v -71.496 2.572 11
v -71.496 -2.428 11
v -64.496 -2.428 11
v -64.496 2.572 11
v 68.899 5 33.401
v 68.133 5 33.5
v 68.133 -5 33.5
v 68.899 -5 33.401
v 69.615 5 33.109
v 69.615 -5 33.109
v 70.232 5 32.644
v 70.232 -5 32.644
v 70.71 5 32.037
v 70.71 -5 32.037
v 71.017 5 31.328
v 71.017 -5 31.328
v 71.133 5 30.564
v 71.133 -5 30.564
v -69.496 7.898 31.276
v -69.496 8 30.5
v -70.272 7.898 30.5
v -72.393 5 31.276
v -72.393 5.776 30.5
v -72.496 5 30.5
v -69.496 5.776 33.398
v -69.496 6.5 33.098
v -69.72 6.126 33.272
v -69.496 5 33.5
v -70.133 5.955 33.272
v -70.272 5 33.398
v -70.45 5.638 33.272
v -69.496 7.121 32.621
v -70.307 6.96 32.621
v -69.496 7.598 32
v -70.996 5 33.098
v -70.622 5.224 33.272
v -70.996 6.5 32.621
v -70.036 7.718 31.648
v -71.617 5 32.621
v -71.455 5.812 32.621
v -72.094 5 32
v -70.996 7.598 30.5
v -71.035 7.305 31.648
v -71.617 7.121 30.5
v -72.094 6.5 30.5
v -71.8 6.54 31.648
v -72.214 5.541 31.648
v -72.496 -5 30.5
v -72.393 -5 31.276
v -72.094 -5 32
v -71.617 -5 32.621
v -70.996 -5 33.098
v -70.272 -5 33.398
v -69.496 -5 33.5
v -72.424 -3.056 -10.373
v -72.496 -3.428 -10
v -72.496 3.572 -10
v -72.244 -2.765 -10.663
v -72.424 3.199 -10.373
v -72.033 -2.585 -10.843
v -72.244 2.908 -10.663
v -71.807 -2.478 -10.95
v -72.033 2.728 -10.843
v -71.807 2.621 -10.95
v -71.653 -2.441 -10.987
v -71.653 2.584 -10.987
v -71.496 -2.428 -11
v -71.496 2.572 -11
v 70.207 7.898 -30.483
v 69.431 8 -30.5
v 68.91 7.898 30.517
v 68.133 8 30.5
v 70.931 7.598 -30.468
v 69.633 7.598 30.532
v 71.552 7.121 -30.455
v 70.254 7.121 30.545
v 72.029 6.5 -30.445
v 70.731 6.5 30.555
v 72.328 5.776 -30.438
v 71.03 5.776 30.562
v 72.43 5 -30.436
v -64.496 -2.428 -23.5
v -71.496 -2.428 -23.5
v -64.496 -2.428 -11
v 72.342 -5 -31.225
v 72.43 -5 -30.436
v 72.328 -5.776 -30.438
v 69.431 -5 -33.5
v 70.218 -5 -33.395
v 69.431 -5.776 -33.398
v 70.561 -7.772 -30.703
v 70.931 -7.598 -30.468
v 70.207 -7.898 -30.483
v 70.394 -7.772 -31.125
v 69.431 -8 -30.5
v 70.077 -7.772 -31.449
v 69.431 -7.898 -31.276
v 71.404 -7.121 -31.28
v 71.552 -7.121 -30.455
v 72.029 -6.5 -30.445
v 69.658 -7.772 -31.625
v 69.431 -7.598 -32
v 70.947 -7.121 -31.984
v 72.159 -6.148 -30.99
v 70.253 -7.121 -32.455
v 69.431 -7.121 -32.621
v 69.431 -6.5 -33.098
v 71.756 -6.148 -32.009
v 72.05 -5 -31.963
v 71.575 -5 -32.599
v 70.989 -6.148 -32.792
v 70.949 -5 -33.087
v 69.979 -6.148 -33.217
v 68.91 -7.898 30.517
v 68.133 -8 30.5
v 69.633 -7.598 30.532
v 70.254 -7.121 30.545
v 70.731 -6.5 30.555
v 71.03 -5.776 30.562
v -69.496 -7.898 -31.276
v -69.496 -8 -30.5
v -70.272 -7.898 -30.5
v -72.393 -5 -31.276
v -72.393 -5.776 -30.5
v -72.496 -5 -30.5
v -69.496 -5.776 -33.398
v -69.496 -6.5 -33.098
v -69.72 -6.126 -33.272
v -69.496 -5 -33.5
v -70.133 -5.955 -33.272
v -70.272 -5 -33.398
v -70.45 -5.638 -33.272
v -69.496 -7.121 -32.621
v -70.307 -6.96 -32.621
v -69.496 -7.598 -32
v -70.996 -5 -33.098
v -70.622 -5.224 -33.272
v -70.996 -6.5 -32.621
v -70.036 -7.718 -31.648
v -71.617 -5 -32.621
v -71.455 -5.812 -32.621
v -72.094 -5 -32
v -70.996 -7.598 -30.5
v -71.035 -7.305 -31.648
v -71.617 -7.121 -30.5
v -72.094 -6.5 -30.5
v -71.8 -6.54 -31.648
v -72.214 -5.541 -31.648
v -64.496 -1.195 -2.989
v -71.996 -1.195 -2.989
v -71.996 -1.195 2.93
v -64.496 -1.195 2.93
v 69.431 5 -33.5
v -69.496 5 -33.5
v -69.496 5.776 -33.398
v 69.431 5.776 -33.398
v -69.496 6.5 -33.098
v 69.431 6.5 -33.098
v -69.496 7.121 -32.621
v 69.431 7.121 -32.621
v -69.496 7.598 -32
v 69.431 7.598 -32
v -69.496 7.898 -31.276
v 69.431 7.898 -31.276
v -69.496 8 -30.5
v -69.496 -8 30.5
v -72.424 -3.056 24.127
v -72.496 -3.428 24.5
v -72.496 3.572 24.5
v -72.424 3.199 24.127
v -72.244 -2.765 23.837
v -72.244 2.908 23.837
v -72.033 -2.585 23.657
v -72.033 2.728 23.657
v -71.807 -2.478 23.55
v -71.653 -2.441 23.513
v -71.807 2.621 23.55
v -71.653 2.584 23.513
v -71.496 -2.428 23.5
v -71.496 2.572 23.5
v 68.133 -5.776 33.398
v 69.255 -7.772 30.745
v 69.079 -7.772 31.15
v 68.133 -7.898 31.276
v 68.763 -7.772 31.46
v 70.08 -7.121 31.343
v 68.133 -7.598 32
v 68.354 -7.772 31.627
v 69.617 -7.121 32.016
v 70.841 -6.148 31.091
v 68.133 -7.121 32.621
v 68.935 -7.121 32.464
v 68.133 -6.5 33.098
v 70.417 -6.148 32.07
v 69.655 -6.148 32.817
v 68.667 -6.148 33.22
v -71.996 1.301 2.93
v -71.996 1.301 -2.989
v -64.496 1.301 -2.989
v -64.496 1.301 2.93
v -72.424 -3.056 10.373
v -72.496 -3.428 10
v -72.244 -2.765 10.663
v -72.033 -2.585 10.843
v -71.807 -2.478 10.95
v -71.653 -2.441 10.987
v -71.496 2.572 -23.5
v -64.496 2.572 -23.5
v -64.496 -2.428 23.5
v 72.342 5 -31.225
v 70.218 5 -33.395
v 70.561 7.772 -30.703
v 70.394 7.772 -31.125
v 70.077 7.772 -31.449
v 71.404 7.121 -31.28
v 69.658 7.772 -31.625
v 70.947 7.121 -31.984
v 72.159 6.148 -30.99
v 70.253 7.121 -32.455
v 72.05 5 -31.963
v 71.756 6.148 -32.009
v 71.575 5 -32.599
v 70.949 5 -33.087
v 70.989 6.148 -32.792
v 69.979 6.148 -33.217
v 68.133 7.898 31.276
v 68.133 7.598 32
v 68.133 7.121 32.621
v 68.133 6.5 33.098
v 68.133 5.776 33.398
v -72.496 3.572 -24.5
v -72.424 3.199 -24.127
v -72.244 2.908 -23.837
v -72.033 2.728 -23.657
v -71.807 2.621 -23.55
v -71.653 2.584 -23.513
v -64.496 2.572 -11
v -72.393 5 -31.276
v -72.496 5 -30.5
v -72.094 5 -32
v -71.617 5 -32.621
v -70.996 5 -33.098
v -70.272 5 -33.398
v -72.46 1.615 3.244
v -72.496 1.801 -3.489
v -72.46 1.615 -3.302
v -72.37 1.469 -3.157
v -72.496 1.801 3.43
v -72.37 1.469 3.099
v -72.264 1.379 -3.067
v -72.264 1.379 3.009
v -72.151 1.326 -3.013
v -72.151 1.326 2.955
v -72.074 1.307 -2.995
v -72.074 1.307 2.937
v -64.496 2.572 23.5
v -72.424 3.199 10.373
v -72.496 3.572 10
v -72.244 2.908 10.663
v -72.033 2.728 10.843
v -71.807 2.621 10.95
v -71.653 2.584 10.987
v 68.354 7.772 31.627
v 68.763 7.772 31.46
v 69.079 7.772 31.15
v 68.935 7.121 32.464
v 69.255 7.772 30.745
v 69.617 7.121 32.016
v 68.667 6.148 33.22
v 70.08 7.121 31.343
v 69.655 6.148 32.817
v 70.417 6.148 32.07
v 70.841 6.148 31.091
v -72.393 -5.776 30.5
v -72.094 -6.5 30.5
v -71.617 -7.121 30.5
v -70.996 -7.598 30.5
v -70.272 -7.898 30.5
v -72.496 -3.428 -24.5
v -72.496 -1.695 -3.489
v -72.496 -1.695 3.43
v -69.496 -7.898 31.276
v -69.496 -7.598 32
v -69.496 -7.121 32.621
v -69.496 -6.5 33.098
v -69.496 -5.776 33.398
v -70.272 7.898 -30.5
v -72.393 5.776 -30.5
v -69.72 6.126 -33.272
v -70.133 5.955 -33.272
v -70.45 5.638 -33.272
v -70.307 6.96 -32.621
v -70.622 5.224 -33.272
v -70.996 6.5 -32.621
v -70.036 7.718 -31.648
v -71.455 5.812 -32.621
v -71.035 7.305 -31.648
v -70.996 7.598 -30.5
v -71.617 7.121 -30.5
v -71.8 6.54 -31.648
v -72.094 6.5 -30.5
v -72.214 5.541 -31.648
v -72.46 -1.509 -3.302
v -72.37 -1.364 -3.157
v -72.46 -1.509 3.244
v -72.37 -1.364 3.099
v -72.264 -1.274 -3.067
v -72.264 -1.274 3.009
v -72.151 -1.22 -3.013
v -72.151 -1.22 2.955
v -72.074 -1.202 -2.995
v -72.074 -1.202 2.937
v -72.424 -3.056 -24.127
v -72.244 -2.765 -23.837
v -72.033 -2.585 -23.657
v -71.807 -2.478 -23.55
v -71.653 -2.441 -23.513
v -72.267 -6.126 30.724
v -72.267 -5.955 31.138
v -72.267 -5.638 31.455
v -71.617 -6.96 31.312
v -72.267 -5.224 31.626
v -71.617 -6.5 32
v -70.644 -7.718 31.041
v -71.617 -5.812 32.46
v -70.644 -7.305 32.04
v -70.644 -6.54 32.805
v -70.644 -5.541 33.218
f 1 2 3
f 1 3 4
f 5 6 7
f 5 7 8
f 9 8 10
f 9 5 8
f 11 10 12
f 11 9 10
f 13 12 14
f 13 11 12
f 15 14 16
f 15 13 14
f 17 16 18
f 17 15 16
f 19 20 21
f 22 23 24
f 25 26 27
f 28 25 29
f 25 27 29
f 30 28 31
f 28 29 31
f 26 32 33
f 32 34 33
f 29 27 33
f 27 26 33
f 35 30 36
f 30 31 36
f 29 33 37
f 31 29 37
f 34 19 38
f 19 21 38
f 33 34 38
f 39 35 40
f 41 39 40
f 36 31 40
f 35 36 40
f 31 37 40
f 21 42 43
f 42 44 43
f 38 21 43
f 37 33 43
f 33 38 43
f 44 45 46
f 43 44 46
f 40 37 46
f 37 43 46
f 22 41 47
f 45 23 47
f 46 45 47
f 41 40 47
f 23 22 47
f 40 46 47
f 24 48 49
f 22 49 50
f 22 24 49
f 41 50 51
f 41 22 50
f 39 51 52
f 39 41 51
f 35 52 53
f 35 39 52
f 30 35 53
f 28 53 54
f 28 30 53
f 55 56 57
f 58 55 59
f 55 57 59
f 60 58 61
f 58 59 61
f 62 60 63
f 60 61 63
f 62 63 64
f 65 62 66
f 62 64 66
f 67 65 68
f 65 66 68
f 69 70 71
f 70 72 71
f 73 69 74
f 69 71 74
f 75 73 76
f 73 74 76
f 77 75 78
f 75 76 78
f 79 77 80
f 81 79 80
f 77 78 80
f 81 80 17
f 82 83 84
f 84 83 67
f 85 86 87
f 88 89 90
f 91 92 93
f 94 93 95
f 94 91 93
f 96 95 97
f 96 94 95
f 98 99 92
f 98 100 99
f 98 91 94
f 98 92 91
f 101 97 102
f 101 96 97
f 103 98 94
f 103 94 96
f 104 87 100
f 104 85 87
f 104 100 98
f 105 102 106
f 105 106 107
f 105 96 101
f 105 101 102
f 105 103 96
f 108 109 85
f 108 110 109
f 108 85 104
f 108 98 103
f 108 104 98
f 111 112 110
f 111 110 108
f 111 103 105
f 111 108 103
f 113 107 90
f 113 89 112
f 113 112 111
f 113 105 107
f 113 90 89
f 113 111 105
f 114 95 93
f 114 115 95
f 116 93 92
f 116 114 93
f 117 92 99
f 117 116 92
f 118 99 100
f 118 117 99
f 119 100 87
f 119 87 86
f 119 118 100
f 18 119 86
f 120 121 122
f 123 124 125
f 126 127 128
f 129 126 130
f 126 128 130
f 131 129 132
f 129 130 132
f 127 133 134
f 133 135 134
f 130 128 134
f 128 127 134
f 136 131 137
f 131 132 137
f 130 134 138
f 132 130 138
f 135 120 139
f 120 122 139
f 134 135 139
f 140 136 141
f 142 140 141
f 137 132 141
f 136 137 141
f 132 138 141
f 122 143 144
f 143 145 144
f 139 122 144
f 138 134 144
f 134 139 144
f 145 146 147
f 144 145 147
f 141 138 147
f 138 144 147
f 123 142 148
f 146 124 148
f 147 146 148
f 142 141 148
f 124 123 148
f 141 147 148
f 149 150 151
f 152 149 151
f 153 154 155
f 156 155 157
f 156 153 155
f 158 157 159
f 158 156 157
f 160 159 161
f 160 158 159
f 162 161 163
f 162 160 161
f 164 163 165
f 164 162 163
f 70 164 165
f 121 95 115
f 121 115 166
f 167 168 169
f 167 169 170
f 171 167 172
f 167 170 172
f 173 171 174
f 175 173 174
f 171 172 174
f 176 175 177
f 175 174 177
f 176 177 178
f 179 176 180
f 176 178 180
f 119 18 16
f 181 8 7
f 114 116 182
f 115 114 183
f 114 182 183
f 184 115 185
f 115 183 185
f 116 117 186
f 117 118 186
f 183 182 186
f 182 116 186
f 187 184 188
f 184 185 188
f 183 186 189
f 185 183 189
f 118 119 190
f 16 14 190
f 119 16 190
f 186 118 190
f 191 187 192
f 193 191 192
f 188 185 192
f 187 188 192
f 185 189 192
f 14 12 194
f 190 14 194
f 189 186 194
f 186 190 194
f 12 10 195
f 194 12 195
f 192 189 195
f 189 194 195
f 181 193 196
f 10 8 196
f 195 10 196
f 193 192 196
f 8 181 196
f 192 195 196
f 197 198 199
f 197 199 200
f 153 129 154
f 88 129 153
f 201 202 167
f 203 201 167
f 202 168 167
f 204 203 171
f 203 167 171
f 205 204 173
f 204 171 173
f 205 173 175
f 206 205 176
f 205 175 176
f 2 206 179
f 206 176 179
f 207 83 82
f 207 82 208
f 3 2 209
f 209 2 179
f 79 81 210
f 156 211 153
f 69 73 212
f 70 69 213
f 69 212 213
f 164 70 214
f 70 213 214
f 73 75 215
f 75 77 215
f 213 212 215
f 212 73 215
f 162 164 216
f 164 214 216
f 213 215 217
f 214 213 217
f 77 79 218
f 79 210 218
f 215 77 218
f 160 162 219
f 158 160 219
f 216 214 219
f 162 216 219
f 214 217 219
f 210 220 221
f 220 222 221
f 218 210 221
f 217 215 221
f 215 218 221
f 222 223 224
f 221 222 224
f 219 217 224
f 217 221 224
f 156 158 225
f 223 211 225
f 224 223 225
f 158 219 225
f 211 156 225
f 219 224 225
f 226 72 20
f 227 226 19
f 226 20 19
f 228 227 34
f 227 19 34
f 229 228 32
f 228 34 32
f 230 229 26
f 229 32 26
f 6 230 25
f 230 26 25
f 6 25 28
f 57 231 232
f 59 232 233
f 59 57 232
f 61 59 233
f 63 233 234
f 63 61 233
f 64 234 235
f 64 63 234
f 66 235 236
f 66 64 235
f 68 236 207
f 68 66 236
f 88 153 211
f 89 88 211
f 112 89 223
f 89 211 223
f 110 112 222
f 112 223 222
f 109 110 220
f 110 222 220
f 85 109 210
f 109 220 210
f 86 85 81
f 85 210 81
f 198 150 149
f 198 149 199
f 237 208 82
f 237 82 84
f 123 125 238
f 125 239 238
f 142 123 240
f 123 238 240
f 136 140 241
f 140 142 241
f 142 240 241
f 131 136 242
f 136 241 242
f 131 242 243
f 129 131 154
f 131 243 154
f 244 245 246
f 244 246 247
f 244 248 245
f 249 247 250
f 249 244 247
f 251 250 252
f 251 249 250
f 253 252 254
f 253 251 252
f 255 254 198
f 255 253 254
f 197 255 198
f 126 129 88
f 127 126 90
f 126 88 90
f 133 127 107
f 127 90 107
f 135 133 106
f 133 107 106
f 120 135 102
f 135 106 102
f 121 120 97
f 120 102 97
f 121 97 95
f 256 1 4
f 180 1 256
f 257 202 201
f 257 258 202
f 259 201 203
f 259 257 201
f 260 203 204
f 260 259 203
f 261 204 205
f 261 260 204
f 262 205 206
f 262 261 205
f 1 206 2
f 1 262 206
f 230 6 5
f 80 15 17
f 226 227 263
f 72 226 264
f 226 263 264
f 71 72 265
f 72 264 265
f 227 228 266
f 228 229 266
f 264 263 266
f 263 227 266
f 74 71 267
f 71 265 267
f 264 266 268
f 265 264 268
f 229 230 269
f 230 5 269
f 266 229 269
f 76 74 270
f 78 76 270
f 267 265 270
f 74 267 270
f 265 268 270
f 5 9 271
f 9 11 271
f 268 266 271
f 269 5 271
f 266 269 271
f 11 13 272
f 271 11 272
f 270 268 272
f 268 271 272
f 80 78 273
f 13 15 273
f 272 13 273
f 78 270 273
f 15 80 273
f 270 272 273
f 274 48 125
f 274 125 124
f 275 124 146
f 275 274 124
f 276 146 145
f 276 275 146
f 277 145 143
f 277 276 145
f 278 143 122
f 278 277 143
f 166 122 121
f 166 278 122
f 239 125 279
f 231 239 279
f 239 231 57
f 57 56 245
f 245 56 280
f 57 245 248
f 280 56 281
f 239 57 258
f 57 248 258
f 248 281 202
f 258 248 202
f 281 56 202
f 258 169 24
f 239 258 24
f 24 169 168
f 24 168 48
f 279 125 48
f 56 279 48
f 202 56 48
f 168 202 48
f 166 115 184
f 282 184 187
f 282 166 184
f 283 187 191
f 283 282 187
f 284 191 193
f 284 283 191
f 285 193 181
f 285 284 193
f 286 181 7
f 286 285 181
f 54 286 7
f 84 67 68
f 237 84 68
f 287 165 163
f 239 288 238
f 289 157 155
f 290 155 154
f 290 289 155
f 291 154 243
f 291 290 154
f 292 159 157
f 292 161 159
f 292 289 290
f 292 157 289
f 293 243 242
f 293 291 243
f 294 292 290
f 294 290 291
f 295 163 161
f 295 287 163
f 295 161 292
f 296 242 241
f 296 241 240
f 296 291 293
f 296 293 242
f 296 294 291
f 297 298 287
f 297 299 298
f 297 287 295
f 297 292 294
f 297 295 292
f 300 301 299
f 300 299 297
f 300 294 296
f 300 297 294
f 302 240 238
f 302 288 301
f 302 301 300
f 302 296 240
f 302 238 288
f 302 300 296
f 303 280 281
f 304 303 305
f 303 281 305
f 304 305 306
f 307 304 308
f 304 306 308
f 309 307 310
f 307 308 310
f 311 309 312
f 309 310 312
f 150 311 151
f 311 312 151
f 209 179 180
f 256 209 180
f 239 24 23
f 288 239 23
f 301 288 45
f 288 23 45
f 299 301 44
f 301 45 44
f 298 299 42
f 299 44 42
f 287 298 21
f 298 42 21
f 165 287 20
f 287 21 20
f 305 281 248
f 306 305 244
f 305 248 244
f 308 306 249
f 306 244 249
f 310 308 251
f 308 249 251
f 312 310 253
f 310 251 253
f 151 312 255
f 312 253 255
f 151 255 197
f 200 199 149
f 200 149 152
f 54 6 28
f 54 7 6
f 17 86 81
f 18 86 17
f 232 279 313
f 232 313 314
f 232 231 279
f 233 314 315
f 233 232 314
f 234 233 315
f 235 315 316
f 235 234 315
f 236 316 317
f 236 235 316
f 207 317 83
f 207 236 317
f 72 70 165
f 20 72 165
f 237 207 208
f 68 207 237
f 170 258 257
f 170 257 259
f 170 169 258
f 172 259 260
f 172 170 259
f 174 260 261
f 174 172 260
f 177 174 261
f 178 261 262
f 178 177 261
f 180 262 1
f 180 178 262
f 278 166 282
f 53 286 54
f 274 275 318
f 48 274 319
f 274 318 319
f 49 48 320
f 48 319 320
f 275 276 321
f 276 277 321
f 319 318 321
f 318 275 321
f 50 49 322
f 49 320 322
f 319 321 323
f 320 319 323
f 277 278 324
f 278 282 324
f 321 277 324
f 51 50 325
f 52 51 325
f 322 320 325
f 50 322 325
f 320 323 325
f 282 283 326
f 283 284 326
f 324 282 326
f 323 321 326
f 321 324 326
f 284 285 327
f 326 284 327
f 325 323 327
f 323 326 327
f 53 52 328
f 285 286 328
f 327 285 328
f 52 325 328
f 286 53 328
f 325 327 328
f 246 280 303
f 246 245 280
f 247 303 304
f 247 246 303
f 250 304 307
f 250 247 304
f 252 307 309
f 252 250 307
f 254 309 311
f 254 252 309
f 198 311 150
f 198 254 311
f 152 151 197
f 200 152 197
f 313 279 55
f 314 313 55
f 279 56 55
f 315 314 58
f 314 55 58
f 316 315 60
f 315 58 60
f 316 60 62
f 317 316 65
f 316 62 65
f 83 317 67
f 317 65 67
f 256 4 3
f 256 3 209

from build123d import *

# Parameters (mm, degrees)
BOSS_EXTRUDE2_DEPTH      = 8
BOSS_EXTRUDE2_DEPTH_BACK = 8
SKETCH3_W                = 12.5
SKETCH3_H                = 5
SKETCH3_W_2              = 5.918941358
SKETCH3_H_2              = 2.496427957
CUT_EXTRUDE1_DEPTH       = 8
FILLET1_R                = 3
FILLET2_R                = 1
FILLET3_R                = 0.5


with BuildPart() as part:
    # Sketch2 → Boss-Extrude2 (new, two sides: drawn at the far end of the back side and taken through both)
    with BuildSketch(Plane(origin=(0, 0, 0), x_dir=(1, 0, 0), z_dir=(0, 1, 0)).offset(-BOSS_EXTRUDE2_DEPTH_BACK)):
        Polygon((-72.495595293, -0.799164043), (-72.495595293, 33.5), (72.495595293, 33.5), (71.070165431, -33.5), (-72.495595293, -33.5), align=None)
    extrude(amount=BOSS_EXTRUDE2_DEPTH + BOSS_EXTRUDE2_DEPTH_BACK)

    # Sketch3 → Cut-Extrude1 (cut)
    with BuildSketch(Plane.ZY.offset(72.495595293)):
        with Locations((-17.25, 0.071666465)):
            Rectangle(SKETCH3_W, SKETCH3_H)
        with Locations((17.25, 0.071666465)):
            Rectangle(SKETCH3_W, SKETCH3_H)
        with Locations((-0.029122914, 0.052810579)):
            Rectangle(SKETCH3_W_2, SKETCH3_H_2)
    extrude(amount=-CUT_EXTRUDE1_DEPTH, mode=Mode.SUBTRACT)

    # Fillet1
    fillet1_edges = [part.edges().sort_by_distance(p)[0] for p in [
        (71.782880362, -8, 0),
        (-72.495595293, 8, 0),
        (-0.712714931, 8, 33.5),
        (71.782880362, 8, 0),
        (0, 8, -33.5),
        (-0.712714931, -8, 33.5),
        (-72.495595293, -8, 0),
        (0, -8, -33.5),
        (-72.495595293, 0, 33.5),
        (71.070165431, 0, 33.5),
        (72.495595293, 0, -33.5),
        (-72.495595293, 0, -33.5),
    ]]
    fillet(fillet1_edges, radius=FILLET1_R)

    # Fillet2
    fillet2_edges = [part.edges().sort_by_distance(p)[0] for p in [
        (-72.495595293, -2.428333535, 17.25),
        (-72.495595293, 0.071666465, 23.5),
        (-72.495595293, 2.571666465, 17.25),
        (-72.495595293, 0.071666465, 11),
        (-72.495595293, 2.571666465, -17.25),
        (-72.495595293, 0.071666465, -23.5),
        (-72.495595293, -2.428333535, -17.25),
        (-72.495595293, 0.071666465, -11),
    ]]
    fillet(fillet2_edges, radius=FILLET2_R)

    # Fillet3
    fillet3_edges = [part.edges().sort_by_distance(p)[0] for p in [
        (-72.495595293, -1.1954034, -0.029122914),
        (-72.495595293, 0.052810578, 2.930347765),
        (-72.495595293, 1.301024557, -0.029122914),
        (-72.495595293, 0.052810578, -2.988593593),
    ]]
    fillet(fillet3_edges, radius=FILLET3_R)


solid = part.part
